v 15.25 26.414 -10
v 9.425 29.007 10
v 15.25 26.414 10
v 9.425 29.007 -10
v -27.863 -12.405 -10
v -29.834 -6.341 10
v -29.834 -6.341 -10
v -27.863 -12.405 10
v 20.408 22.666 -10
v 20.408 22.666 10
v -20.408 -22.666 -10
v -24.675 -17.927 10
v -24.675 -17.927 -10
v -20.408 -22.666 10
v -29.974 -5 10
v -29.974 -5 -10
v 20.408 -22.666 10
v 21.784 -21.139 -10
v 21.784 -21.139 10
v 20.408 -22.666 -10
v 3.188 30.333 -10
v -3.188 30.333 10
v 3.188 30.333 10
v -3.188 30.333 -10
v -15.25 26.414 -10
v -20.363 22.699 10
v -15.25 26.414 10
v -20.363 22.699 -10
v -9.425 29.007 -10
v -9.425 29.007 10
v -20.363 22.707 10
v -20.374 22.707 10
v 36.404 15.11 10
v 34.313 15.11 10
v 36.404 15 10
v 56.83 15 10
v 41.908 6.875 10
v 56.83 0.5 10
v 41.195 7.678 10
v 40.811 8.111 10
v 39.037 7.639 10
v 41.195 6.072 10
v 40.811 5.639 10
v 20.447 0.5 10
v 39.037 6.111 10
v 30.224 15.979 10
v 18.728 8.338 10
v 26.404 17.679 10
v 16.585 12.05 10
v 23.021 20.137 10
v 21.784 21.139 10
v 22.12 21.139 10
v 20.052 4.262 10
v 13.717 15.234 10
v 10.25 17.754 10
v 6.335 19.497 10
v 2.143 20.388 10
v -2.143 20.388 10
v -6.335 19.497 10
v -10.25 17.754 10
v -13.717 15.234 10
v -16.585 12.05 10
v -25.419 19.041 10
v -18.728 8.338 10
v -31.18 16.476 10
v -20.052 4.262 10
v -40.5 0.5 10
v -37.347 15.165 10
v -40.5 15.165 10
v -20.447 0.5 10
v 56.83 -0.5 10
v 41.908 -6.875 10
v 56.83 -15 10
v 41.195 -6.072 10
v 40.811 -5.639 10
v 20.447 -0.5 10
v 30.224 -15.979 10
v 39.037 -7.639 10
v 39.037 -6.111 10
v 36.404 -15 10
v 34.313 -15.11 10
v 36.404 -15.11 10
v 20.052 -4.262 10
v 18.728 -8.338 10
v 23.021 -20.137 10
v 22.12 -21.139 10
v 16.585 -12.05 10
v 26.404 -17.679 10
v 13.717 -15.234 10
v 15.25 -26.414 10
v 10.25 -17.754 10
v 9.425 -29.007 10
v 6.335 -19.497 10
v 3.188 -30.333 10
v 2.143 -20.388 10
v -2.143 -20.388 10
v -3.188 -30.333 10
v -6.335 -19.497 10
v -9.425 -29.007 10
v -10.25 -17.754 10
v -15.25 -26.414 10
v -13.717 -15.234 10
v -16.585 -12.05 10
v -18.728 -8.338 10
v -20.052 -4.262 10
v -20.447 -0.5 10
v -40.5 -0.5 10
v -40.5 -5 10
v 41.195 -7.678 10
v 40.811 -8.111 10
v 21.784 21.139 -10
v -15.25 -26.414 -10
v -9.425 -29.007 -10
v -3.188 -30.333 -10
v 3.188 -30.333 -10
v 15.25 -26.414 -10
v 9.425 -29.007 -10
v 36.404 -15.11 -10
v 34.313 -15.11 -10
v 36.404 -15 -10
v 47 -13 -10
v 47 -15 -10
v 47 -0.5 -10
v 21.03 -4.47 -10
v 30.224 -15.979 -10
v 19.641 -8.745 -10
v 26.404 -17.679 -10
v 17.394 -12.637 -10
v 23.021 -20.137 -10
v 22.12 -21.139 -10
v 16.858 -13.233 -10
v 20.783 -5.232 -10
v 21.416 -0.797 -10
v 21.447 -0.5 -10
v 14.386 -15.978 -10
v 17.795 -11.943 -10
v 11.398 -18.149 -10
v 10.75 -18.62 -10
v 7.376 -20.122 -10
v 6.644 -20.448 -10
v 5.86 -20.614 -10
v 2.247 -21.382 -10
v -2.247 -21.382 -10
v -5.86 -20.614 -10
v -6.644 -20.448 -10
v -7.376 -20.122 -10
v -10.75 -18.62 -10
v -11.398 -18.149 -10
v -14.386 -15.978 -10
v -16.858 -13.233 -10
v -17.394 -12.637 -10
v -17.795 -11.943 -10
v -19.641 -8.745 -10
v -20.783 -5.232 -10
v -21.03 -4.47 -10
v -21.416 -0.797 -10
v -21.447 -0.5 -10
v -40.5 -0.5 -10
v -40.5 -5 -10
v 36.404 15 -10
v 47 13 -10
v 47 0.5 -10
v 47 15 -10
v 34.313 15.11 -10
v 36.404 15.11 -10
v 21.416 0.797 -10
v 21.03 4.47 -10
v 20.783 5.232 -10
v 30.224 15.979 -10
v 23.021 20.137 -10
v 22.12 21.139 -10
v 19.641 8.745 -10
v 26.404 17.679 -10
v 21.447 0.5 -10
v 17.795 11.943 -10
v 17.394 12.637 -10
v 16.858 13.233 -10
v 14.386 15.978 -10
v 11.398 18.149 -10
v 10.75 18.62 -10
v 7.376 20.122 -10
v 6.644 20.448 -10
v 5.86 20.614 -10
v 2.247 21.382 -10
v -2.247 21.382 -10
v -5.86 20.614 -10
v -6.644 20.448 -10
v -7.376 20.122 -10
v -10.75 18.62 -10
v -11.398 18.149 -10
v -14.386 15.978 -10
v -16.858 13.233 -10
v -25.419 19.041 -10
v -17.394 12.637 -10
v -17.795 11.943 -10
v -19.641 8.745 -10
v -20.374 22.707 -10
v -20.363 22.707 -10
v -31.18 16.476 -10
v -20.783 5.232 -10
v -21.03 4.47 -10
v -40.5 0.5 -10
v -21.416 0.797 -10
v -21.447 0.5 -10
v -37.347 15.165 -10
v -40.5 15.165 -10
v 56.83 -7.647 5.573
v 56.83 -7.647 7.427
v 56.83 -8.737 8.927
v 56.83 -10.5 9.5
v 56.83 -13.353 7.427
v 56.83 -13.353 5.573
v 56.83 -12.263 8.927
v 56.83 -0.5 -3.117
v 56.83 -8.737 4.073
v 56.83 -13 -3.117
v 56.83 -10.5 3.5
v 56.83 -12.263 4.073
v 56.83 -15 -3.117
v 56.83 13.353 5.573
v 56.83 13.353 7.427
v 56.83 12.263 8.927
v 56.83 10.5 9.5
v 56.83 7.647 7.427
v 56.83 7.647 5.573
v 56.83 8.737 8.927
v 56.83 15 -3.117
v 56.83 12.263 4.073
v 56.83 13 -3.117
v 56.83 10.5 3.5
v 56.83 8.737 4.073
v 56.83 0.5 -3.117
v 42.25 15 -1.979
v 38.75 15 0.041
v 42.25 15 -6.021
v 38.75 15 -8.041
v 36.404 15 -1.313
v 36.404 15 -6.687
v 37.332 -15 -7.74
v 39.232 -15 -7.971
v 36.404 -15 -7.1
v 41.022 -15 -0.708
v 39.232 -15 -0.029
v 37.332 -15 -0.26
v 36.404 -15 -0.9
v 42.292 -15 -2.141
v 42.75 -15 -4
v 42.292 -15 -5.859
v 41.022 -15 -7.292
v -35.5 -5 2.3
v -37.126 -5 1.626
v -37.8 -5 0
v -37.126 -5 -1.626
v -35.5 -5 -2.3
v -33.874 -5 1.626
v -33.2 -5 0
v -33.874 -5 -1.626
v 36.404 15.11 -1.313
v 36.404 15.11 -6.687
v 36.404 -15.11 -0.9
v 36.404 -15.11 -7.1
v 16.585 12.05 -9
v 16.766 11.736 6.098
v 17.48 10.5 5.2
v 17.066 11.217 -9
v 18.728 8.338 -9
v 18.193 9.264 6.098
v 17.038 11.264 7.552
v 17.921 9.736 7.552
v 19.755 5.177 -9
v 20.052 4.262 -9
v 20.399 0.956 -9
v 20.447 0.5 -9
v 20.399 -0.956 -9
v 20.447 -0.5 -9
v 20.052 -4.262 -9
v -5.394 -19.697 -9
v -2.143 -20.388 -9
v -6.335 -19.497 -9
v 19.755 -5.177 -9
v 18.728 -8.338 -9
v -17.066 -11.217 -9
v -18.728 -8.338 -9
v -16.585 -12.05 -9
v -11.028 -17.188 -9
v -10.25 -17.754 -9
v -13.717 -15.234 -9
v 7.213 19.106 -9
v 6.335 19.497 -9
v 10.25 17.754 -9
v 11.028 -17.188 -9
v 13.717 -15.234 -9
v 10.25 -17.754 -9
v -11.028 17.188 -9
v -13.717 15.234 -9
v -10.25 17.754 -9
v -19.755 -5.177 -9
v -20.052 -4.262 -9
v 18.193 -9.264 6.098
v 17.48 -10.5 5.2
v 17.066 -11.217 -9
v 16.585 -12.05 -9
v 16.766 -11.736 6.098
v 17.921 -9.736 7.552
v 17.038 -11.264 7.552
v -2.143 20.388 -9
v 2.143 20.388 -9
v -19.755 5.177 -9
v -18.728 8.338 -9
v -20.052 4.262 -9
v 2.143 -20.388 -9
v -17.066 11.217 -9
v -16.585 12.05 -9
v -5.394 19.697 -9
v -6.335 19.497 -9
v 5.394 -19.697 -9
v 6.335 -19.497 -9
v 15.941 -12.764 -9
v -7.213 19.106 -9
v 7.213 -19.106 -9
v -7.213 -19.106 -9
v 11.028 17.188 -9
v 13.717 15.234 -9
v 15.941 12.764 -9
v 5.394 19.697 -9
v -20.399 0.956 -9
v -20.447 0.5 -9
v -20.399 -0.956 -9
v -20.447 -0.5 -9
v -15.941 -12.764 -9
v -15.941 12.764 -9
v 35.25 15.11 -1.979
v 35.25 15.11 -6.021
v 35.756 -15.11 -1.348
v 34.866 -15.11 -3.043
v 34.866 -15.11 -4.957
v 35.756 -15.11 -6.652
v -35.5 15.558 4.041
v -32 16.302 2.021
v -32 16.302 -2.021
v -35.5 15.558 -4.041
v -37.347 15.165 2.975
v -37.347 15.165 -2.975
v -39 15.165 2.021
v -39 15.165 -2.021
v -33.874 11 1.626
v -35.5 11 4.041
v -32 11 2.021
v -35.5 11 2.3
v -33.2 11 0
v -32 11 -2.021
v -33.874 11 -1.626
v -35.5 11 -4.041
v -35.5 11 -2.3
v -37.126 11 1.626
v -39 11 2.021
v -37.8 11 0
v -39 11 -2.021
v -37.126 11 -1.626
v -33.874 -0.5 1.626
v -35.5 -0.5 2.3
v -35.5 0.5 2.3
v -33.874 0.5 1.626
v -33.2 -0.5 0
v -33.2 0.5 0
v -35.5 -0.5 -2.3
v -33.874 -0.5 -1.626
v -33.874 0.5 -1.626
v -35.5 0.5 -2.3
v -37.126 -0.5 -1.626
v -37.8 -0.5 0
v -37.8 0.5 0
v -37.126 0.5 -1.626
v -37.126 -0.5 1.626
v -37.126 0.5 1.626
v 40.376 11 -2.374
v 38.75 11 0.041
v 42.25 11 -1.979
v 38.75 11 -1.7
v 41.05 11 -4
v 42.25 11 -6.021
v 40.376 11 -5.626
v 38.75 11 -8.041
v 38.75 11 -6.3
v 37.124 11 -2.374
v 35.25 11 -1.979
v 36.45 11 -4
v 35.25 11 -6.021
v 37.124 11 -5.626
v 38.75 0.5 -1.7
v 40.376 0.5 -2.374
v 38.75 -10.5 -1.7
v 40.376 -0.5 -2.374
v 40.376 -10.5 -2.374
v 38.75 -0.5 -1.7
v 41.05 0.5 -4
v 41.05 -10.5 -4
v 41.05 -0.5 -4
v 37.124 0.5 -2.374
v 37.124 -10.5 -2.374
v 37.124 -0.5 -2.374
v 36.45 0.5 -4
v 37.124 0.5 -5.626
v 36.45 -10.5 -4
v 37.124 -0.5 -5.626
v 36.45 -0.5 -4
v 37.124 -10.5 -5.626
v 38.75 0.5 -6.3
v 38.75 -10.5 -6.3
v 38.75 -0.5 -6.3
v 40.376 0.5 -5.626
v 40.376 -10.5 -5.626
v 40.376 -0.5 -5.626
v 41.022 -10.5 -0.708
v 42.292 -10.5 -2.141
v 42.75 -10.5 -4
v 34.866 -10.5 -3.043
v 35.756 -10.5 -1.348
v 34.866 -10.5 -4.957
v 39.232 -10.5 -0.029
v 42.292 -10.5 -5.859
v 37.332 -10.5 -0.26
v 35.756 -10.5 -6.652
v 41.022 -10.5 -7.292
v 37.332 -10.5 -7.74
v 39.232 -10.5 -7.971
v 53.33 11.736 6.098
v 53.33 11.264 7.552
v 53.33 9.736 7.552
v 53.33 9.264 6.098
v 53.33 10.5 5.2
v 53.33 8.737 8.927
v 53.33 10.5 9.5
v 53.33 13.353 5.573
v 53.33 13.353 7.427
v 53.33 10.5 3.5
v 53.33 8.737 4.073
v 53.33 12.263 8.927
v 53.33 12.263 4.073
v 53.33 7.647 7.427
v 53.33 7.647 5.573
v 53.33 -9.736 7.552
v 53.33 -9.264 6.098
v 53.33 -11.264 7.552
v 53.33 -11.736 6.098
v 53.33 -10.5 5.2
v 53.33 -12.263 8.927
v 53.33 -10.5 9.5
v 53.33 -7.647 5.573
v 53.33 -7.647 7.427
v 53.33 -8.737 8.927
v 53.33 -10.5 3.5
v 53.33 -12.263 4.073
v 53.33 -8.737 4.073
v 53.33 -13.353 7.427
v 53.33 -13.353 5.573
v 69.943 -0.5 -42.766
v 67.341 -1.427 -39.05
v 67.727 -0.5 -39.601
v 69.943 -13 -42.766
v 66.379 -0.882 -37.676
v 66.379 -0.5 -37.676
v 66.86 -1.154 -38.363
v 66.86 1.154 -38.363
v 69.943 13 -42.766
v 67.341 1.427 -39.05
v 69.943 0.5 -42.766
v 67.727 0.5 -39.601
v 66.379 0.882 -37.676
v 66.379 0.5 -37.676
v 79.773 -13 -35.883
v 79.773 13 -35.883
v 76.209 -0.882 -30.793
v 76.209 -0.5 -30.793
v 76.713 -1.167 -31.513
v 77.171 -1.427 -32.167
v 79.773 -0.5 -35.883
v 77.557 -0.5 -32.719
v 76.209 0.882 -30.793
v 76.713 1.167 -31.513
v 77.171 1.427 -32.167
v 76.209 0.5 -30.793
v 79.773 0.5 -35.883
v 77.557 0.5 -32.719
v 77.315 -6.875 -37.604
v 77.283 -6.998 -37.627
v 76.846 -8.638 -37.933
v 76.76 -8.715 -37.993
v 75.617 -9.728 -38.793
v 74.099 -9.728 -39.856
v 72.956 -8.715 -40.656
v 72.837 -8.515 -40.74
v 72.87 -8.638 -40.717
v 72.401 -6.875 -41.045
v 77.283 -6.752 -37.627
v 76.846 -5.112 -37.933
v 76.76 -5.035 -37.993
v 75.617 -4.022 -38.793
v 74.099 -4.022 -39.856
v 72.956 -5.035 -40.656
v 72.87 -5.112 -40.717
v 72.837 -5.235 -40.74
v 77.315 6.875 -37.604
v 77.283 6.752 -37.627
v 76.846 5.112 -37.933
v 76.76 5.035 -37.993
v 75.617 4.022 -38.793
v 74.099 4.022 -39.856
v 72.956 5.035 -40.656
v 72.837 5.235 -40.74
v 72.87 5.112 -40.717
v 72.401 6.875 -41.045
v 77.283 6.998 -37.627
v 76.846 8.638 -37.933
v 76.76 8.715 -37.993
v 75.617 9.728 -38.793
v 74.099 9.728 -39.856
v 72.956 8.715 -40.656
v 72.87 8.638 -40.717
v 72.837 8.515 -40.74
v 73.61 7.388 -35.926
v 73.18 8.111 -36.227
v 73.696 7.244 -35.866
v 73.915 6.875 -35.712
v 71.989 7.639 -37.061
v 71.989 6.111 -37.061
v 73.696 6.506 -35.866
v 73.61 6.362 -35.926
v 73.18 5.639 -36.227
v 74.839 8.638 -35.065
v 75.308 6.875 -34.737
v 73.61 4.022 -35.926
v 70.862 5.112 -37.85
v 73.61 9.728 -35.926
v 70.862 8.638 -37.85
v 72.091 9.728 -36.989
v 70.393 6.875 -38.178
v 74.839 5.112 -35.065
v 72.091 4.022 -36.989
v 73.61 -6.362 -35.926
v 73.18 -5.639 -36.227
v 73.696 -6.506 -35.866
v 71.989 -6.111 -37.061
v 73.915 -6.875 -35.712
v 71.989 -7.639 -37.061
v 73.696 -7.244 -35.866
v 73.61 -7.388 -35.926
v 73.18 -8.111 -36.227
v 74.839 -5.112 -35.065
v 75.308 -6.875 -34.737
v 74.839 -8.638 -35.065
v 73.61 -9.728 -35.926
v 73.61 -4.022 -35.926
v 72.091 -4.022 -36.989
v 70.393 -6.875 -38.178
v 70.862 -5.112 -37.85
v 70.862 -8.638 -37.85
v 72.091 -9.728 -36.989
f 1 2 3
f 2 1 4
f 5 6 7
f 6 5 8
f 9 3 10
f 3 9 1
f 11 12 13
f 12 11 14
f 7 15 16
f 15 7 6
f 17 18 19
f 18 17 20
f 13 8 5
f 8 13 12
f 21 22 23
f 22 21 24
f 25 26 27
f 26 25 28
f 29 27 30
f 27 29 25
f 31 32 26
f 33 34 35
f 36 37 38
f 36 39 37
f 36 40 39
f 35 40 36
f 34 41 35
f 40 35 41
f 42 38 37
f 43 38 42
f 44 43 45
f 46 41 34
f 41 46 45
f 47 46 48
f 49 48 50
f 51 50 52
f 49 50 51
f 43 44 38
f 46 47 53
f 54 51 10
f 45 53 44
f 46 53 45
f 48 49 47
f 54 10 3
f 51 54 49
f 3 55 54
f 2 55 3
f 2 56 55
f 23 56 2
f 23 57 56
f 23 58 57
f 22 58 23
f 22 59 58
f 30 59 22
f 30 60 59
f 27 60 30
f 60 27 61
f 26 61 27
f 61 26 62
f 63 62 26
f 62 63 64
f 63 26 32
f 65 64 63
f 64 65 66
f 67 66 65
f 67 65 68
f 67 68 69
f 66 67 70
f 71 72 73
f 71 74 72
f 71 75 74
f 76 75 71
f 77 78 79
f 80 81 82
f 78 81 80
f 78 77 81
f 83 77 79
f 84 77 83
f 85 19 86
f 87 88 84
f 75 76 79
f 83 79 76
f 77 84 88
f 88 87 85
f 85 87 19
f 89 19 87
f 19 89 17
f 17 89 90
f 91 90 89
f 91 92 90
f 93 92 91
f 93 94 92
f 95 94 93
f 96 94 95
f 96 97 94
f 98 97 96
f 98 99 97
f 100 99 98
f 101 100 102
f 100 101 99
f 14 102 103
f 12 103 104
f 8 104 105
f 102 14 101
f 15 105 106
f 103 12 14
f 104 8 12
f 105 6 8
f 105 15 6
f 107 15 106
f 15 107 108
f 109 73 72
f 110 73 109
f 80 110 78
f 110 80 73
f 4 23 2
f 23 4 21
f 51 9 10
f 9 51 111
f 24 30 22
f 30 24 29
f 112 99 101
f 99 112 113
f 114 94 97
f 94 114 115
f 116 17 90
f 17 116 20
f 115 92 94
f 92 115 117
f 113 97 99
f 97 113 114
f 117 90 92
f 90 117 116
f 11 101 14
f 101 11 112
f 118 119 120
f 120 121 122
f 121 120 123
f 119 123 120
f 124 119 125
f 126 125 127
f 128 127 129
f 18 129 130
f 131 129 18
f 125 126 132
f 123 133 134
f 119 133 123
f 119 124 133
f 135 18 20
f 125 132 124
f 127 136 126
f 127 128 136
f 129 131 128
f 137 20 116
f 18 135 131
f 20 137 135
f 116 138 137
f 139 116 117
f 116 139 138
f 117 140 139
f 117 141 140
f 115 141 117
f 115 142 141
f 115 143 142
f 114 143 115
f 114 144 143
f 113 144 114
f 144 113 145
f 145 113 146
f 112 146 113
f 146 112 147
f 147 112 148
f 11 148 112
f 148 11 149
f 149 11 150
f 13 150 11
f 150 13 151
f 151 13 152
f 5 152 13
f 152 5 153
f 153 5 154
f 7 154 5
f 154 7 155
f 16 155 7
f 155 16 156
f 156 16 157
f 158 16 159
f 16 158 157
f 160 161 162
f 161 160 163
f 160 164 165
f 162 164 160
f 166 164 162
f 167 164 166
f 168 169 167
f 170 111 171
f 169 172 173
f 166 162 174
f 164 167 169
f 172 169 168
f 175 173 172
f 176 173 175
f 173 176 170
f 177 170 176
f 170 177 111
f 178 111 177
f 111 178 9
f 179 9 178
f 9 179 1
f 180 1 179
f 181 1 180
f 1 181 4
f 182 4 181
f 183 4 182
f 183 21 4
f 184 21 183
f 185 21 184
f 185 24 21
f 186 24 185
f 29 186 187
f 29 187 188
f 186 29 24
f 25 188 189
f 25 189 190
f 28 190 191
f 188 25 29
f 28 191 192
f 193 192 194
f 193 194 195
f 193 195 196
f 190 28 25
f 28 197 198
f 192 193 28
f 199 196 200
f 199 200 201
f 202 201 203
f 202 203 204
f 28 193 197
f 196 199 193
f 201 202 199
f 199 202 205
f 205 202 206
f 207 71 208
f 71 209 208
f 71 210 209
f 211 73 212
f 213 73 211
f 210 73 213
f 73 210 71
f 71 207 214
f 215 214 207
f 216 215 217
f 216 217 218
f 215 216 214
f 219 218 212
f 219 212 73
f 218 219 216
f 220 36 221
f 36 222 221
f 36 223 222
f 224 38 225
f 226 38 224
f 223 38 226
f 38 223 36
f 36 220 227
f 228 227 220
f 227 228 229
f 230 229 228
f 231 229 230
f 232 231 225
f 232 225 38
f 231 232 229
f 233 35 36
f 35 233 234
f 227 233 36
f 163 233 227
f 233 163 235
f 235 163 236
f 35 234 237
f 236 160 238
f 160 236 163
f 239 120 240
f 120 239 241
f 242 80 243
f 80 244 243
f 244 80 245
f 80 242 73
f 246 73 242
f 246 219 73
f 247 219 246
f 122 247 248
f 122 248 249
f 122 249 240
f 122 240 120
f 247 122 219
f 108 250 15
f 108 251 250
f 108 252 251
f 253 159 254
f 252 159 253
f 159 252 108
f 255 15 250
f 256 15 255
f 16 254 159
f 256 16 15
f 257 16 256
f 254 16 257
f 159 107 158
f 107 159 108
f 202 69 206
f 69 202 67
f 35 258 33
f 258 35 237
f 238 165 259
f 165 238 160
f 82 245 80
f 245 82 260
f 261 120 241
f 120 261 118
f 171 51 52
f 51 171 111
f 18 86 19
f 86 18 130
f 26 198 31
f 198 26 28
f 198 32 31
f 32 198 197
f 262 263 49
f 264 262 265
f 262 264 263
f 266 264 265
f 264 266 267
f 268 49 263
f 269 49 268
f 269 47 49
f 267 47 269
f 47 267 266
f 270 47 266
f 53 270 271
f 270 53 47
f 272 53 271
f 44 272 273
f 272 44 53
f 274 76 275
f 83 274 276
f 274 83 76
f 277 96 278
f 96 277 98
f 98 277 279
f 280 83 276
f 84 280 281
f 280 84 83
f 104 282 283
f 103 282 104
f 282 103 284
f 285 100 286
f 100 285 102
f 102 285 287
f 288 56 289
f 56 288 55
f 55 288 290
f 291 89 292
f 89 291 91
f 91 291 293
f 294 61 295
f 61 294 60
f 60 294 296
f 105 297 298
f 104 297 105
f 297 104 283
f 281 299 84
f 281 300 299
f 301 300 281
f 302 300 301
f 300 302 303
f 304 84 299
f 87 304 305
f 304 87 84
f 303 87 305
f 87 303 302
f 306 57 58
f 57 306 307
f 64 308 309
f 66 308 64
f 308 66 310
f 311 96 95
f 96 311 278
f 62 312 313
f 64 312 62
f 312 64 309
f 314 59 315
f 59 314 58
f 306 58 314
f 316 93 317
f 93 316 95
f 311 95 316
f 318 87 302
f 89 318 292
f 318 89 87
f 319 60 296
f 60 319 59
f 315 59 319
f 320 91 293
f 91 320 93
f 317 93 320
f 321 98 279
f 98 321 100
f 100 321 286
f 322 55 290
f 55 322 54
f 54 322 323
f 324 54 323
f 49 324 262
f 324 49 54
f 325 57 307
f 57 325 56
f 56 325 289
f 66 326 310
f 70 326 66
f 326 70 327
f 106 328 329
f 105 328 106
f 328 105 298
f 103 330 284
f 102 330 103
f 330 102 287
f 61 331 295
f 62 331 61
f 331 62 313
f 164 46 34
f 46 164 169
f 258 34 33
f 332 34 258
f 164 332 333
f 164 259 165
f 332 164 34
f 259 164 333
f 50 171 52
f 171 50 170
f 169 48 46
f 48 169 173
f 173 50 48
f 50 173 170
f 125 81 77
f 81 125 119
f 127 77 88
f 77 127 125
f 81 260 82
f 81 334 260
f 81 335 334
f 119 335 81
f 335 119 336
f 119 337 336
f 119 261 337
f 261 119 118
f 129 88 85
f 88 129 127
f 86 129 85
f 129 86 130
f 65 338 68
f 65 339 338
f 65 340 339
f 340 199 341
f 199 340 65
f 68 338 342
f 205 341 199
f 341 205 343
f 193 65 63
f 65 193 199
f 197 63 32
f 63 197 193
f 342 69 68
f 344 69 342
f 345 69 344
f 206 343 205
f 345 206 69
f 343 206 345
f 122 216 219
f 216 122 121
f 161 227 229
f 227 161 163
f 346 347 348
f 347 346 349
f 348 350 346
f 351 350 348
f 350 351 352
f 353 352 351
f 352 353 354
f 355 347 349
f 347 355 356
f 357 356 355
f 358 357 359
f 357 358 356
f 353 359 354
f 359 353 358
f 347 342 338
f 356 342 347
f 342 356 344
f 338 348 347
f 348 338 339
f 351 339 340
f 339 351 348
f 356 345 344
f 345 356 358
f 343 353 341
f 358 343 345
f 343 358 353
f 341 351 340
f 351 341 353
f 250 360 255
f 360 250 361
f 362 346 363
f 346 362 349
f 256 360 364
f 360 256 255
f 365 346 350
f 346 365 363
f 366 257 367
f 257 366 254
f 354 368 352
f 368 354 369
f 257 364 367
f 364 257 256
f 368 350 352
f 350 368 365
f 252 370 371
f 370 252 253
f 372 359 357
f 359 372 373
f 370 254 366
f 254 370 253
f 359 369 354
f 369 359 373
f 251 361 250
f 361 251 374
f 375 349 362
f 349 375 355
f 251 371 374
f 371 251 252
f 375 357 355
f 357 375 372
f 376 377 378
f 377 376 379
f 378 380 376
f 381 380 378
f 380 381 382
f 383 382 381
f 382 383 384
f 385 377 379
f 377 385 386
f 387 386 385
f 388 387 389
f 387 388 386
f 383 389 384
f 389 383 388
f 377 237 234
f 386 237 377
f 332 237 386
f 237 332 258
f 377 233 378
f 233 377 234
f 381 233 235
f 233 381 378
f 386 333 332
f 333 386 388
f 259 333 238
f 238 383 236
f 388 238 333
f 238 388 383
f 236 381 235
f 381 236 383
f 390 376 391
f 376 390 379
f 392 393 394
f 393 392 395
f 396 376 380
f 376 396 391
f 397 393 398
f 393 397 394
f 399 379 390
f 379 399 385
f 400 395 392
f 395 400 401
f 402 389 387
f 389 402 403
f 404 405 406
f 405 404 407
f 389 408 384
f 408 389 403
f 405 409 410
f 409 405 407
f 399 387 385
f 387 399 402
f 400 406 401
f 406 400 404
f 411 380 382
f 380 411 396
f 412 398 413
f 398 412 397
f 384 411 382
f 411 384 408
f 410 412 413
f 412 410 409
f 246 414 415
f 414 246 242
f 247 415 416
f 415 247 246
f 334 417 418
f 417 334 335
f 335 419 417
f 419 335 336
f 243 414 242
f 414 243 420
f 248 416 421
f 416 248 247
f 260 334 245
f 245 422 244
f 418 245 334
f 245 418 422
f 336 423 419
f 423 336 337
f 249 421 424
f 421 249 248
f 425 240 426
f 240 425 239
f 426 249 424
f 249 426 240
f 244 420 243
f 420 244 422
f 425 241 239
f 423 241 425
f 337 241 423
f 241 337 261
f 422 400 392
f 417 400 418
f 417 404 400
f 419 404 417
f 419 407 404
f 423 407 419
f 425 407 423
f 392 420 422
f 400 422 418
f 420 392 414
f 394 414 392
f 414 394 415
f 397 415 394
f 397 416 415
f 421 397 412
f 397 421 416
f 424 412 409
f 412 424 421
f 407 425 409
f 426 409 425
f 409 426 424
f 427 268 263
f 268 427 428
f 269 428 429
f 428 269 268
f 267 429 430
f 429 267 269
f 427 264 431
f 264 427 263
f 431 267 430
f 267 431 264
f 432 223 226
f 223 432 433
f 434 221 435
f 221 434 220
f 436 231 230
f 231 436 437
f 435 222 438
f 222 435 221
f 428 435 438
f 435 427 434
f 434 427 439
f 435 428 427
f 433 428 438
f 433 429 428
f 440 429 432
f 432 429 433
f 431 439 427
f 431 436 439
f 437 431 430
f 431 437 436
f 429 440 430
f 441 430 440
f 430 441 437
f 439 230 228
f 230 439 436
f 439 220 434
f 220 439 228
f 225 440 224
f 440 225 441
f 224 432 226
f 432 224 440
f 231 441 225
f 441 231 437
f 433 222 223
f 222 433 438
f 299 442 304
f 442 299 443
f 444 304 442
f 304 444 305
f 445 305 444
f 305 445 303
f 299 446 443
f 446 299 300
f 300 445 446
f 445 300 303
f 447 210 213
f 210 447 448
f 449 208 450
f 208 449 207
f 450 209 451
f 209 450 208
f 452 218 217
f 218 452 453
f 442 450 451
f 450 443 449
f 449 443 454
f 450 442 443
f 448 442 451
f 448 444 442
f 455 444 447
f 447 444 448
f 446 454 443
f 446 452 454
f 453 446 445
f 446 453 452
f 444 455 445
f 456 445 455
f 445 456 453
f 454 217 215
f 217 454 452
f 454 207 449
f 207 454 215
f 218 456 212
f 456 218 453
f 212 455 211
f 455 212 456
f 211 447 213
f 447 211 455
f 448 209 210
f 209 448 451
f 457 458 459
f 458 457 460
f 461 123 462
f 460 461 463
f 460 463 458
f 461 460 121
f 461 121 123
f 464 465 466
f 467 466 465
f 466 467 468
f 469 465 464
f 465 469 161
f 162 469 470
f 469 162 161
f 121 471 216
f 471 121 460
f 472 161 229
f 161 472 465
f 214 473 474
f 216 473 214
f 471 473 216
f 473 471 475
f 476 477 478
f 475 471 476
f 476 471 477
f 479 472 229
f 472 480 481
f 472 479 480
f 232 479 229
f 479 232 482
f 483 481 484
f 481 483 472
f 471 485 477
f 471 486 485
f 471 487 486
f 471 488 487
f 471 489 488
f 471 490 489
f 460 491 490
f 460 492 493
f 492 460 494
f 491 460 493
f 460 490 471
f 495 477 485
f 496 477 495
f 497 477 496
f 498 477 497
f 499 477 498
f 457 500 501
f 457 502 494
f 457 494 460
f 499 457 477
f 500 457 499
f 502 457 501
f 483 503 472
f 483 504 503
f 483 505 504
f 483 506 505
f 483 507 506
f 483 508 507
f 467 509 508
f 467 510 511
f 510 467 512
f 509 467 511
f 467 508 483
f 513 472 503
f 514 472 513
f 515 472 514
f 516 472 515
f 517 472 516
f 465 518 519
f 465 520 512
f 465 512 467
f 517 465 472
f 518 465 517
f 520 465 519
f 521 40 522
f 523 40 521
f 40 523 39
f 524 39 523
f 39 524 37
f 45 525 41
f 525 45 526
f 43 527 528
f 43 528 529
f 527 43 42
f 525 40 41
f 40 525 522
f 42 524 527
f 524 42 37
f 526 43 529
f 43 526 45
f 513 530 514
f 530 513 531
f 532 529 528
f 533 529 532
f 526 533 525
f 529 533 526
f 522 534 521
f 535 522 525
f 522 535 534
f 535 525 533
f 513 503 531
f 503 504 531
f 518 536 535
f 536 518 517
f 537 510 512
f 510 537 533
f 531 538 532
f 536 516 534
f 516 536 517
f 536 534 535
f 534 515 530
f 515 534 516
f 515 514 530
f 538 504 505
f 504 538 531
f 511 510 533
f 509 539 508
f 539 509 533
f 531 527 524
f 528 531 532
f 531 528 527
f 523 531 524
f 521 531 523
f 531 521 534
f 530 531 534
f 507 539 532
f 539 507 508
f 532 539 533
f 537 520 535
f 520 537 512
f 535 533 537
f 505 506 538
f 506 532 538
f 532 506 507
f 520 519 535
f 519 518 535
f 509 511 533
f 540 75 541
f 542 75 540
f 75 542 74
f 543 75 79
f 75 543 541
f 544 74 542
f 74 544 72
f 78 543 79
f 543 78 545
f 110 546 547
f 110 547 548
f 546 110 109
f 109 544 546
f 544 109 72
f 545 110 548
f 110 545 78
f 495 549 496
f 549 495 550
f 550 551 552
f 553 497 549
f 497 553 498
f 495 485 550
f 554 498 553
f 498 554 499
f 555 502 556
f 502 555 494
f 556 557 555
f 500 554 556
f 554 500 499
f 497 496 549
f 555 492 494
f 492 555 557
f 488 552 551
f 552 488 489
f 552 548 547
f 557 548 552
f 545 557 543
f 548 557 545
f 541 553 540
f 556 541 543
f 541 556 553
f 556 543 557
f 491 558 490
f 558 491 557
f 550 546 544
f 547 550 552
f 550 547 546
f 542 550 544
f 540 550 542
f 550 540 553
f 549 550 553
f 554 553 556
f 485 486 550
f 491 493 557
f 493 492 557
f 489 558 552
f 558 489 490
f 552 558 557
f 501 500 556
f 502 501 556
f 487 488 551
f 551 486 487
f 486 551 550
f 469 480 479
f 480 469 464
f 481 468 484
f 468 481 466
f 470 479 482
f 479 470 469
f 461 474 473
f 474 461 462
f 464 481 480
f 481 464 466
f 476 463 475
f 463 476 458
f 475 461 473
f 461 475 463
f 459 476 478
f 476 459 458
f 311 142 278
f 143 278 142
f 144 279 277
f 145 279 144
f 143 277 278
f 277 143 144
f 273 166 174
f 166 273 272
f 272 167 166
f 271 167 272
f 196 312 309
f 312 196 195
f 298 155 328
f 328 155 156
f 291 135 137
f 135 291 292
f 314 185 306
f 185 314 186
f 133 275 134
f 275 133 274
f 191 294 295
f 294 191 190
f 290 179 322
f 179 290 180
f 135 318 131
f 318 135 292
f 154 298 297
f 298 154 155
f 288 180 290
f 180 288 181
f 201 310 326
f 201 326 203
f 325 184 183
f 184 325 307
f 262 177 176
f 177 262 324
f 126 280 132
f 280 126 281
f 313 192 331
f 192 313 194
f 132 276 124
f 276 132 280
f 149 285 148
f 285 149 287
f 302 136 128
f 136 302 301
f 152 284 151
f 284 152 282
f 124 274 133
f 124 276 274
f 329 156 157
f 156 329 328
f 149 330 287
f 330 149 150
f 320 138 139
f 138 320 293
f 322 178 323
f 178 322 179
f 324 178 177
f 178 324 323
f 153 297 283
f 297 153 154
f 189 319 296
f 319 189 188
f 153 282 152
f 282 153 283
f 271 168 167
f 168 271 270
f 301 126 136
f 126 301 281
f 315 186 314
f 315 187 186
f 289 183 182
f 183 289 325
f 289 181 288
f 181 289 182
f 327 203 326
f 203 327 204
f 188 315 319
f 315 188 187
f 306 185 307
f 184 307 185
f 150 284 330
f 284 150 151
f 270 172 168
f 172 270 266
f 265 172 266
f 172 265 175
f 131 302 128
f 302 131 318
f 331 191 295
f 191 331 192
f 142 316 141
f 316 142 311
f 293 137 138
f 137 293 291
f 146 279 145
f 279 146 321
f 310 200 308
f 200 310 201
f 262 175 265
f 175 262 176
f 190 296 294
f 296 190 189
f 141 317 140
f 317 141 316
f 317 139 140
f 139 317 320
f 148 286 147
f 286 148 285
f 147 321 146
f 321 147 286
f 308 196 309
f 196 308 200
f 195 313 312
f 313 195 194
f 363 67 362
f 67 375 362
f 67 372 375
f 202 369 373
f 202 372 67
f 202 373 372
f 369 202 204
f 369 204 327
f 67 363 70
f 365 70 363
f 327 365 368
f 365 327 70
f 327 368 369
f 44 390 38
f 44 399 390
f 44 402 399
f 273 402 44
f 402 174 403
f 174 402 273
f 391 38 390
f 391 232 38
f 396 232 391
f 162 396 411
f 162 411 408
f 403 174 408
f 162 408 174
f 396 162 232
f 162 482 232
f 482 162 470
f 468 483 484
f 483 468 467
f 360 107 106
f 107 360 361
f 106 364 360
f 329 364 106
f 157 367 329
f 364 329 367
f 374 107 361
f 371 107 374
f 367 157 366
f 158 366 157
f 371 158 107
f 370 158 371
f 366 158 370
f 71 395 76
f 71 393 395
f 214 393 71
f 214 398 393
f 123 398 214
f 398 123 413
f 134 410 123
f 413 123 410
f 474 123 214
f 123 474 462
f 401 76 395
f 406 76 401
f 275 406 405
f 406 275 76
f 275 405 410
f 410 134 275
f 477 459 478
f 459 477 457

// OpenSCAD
d_luknje = 41; //premer luknje za glavo
l_luknje = 47; //oddaljenost luknje za glavo od posevnega cepa
kot = 35; //kot posevnega cepa od navpicnice
b_cepa = 26; //sirina cepa
t_cepa = 12; //debelina cepa
l_cepa = 40; //dolzina cepa
d_aluminij = 2; //debelina aluminijastega ohisja, kamor je pritrjen celoten nosilec
del = 0; //del=1 za prvi kos nosilca, del=2 za drugi kos nosilca, del=0 za oba kosa



difference () {
	union () {
		difference() {
			union () {

				// glavni del nosilca okoli glave - dodano
				cylinder(20,r=d_luknje/2+10,center=true); //obroc okoli glave
				translate([0,-b_cepa/2-d_aluminij,-10]) cube([l_luknje+t_cepa*cos(kot),b_cepa+2*d_aluminij,20]); //kvader kot podaljsek obroca
				rotate([0,0,90]) translate([-5,d_luknje/2+5,-10]) cube([10,10+5,20]); //strcelj za vijak
				translate([0,-(d_luknje/2+10)*(20+b_cepa/2+d_aluminij)/(20+d_luknje/2+10),-10]) cube([sqrt((20+d_luknje/2+10)*(20+d_luknje/2+10)-(20+b_cepa/2+d_aluminij)*(20+b_cepa/2+d_aluminij)),2*(d_luknje/2+10)*(20+b_cepa/2+d_aluminij)/(20+d_luknje/2+10),20]); //okroglini pri cepu
				translate([-(d_luknje/2+20),0,-10]) cube([((-1200-b_cepa*b_cepa-4*b_cepa*d_aluminij-4*d_aluminij*d_aluminij-40*d_luknje)*(20+d_luknje/2))/(4*(-20+b_cepa+2*d_aluminij-d_luknje)*(10+((-1200-b_cepa*b_cepa-4*b_cepa*d_aluminij-4*d_aluminij*d_aluminij-40*d_luknje)/(4*(-20+b_cepa+2*d_aluminij-d_luknje)))+d_luknje/2)),b_cepa/2+d_aluminij+(-1200-b_cepa*b_cepa-4*b_cepa*d_aluminij-4*d_aluminij*d_aluminij-40*d_luknje)/(4*(-20+b_cepa+2*d_aluminij-d_luknje))-(b_cepa/2+d_aluminij+(-1200-b_cepa*b_cepa-4*b_cepa*d_aluminij-4*d_aluminij*d_aluminij-40*d_luknje)/(4*(-20+b_cepa+2*d_aluminij-d_luknje)))*(-1200-b_cepa*b_cepa-4*b_cepa*d_aluminij-4*d_aluminij*d_aluminij-40*d_luknje)/((4*(-20+b_cepa+2*d_aluminij-d_luknje))*(10+(-1200-b_cepa*b_cepa-4*b_cepa*d_aluminij-4*d_aluminij*d_aluminij-40*d_luknje)/(4*(-20+b_cepa+2*d_aluminij-d_luknje))+d_luknje/2)),20]); //okroglina pri strclju za vijak

				}

			// glavni del nosilca okoli glave - odvzeto
			cylinder(30,r=d_luknje/2,center=true); //luknja za glavo
			translate([sqrt((20+d_luknje/2+10)*(20+d_luknje/2+10)-(20+b_cepa/2+d_aluminij)*(20+b_cepa/2+d_aluminij)),20+b_cepa/2+d_aluminij,0]) cylinder(30,r=20,center=true); //okroglina pri cepu levo
			translate([sqrt((20+d_luknje/2+10)*(20+d_luknje/2+10)-(20+b_cepa/2+d_aluminij)*(20+b_cepa/2+d_aluminij)),-20-b_cepa/2-d_aluminij,0]) cylinder(30,r=20,center=true); //okroglina pri cepu desno
			translate([-(d_luknje/2+20),b_cepa/2+d_aluminij+(-1200-b_cepa*b_cepa-4*b_cepa*d_aluminij-4*d_aluminij*d_aluminij-40*d_luknje)/(4*(-20+b_cepa+2*d_aluminij-d_luknje)),0]) cylinder(30,r=(-1200-b_cepa*b_cepa-4*b_cepa*d_aluminij-4*d_aluminij*d_aluminij-40*d_luknje)/(4*(-20+b_cepa+2*d_aluminij-d_luknje)),center=true); //okroglina pri strclju za vijak

			// posevnina za cep za pritrditev nosilca glave na kroznik
			translate([l_luknje+t_cepa*cos(kot),b_cepa/2+d_aluminij+5,-10+t_cepa*sin(kot)]) rotate([180,90-kot,0]) cube([100,b_cepa+2*d_aluminij+10,t_cepa]); //odrezana posevnina za cep

			// vijaki za spojitev obeh delov
			translate([-(d_luknje/2+15),b_cepa/2+d_aluminij-4+25,0]) rotate([90,0,0]) linear_extrude(height = 50, center = true, convexity = 10, twist = 0) polygon(points=[[0,3.5/cos(30)],[3.5,3.5*tan(30)],[3.5,-3.5*tan(30)],[0,-3.5/cos(30)],[-3.5,-3.5*tan(30)],[-3.5,3.5*tan(30)]], paths=[[0,1,2,3,4,5]]); //luknja za matico za spojitev obeh delov
			translate([-(d_luknje/2+15),b_cepa/2+d_aluminij-4+10,0]) rotate([90,0,0]) cylinder(200,r=2.3,center=true); //luknja za vijak za spojitev obeh delov
			translate([d_luknje/2+10+0.5*(l_luknje-d_luknje/2-10),b_cepa/2+d_aluminij-4+25,-4]) rotate([90,0,0]) linear_extrude(height = 50, center = true, convexity = 10, twist = 0) polygon(points=[[0,3.5/cos(30)],[3.5,3.5*tan(30)],[3.5,-3.5*tan(30)],[0,-3.5/cos(30)],[-3.5,-3.5*tan(30)],[-3.5,3.5*tan(30)]], paths=[[0,1,2,3,4,5]]); //luknja za matico za spojitev obeh delov
			translate([d_luknje/2+10+0.5*(l_luknje-d_luknje/2-10),b_cepa/2+d_aluminij-4+10,-4]) rotate([90,0,0]) cylinder(200,r=2.3,center=true); //luknja za vijak za spojitev obeh delov
			translate([d_luknje/2+10+0.5*(l_luknje-d_luknje/2-10),-(b_cepa/2+d_aluminij-4.5+25),-4]) rotate([90,0,0]) cylinder(50,r=4,center=true); //luknja za glavo za vijak za spojitev obeh delov

			// vijaki za ojacitev spodaj
			translate([(l_luknje+t_cepa*cos(kot)+10)/2,b_cepa/2+d_aluminij-4.5,6.5]) rotate([0,90,0]) cylinder(l_luknje+t_cepa*cos(kot)+10,r=1.3,center=true); //luknja za vijak za ojacitev spodaj levo
		translate([l_luknje+t_cepa*cos(kot)+25-3.5,b_cepa/2+d_aluminij-4.5,6.5]) rotate([0,90,0]) cylinder(50,r=3,center=true); //luknja za glavo za vijak za ojacitev spodaj levo
		translate([(l_luknje+t_cepa*cos(kot)+10)/2,-(b_cepa/2+d_aluminij-4.5),6.5]) rotate([0,90,0]) cylinder(l_luknje+t_cepa*cos(kot)+10,r=1.3,center=true); //luknja za vijak za ojacitev spodaj desno
		translate([l_luknje+t_cepa*cos(kot)+25-3.5,-(b_cepa/2+d_aluminij-4.5),6.5]) rotate([0,90,0]) cylinder(50,r=3,center=true); //luknja za glavo za vijak za ojacitev spodaj desno

			}

		// cep za pritrditev nosilca glave na kroznik (posevni del)
		translate([l_luknje+t_cepa*cos(kot),b_cepa/2,-10+t_cepa*sin(kot)]) rotate([180,90-kot,0]) cube([l_cepa,b_cepa,t_cepa]); //cep za pritrditev nosilca glave na kroznik z dodatkom kvadra

	}

	// vijaki za ojacitev posevno
	translate([l_luknje+t_cepa/2/cos(kot),(b_cepa-0.5)/4+0.5,-10]) rotate([0,-kot,0]) cylinder(4*l_cepa,r=1.3,center=true); //luknja za vijak za ojacitev posevno levo
	translate([l_luknje+t_cepa/2/cos(kot),(b_cepa-0.5)/4+0.5,-10]) rotate([0,-kot,0]) translate([0,0,-(-t_cepa/2*tan(kot)+l_cepa+25-3.5)]) cylinder(50,r=3,center=true); //luknja za glavo za vijak za ojacitev posevno levo
	translate([l_luknje+t_cepa/2/cos(kot),-((b_cepa-0.5)/4+0.5),-10]) rotate([0,-kot,0]) cylinder(4*l_cepa,r=1.3,center=true); //luknja za vijak za ojacitev posevno desno
	translate([l_luknje+t_cepa/2/cos(kot),-((b_cepa-0.5)/4+0.5),-10]) rotate([0,-kot,0]) translate([0,0,-(-t_cepa/2*tan(kot)+l_cepa+25-3.5)]) cylinder(50,r=3,center=true); //luknja za glavo za vijak za ojacitev posevno desno

	// luknja za pritrditev nosilca glave
	translate([l_luknje,0,-10]) rotate([0,90-kot,0]) translate([35,0,0]) cylinder(500,r=1.5,center=true); //luknja na posevnem delu za pritrditev nosilca glave z vijakom na kroznik z odvzemom valja

	// posnetje luknje za glavo
	translate([0,0,-7.5]) cylinder(h=15,r1=d_luknje/2+6,r2=d_luknje/2-9,center=true); //posnetje luknje za glavo s fazo 1/45° z odvzemom stozca

	// reza po sredini
	cube([500,1,500],center=true); //reza po sredini nosilca z odvzemom kvadra

	// razrez na pol
	if (del==1) {
	translate([0,250,0]) cube([500,500,500],center=true);
	} else if (del==2) {
	translate([0,-250,0]) cube([500,500,500],center=true);
	} else {
	} //razrez na pol, ce je del==1 potem je prvi kos, ce je del==2 potem je drugi kos

}
